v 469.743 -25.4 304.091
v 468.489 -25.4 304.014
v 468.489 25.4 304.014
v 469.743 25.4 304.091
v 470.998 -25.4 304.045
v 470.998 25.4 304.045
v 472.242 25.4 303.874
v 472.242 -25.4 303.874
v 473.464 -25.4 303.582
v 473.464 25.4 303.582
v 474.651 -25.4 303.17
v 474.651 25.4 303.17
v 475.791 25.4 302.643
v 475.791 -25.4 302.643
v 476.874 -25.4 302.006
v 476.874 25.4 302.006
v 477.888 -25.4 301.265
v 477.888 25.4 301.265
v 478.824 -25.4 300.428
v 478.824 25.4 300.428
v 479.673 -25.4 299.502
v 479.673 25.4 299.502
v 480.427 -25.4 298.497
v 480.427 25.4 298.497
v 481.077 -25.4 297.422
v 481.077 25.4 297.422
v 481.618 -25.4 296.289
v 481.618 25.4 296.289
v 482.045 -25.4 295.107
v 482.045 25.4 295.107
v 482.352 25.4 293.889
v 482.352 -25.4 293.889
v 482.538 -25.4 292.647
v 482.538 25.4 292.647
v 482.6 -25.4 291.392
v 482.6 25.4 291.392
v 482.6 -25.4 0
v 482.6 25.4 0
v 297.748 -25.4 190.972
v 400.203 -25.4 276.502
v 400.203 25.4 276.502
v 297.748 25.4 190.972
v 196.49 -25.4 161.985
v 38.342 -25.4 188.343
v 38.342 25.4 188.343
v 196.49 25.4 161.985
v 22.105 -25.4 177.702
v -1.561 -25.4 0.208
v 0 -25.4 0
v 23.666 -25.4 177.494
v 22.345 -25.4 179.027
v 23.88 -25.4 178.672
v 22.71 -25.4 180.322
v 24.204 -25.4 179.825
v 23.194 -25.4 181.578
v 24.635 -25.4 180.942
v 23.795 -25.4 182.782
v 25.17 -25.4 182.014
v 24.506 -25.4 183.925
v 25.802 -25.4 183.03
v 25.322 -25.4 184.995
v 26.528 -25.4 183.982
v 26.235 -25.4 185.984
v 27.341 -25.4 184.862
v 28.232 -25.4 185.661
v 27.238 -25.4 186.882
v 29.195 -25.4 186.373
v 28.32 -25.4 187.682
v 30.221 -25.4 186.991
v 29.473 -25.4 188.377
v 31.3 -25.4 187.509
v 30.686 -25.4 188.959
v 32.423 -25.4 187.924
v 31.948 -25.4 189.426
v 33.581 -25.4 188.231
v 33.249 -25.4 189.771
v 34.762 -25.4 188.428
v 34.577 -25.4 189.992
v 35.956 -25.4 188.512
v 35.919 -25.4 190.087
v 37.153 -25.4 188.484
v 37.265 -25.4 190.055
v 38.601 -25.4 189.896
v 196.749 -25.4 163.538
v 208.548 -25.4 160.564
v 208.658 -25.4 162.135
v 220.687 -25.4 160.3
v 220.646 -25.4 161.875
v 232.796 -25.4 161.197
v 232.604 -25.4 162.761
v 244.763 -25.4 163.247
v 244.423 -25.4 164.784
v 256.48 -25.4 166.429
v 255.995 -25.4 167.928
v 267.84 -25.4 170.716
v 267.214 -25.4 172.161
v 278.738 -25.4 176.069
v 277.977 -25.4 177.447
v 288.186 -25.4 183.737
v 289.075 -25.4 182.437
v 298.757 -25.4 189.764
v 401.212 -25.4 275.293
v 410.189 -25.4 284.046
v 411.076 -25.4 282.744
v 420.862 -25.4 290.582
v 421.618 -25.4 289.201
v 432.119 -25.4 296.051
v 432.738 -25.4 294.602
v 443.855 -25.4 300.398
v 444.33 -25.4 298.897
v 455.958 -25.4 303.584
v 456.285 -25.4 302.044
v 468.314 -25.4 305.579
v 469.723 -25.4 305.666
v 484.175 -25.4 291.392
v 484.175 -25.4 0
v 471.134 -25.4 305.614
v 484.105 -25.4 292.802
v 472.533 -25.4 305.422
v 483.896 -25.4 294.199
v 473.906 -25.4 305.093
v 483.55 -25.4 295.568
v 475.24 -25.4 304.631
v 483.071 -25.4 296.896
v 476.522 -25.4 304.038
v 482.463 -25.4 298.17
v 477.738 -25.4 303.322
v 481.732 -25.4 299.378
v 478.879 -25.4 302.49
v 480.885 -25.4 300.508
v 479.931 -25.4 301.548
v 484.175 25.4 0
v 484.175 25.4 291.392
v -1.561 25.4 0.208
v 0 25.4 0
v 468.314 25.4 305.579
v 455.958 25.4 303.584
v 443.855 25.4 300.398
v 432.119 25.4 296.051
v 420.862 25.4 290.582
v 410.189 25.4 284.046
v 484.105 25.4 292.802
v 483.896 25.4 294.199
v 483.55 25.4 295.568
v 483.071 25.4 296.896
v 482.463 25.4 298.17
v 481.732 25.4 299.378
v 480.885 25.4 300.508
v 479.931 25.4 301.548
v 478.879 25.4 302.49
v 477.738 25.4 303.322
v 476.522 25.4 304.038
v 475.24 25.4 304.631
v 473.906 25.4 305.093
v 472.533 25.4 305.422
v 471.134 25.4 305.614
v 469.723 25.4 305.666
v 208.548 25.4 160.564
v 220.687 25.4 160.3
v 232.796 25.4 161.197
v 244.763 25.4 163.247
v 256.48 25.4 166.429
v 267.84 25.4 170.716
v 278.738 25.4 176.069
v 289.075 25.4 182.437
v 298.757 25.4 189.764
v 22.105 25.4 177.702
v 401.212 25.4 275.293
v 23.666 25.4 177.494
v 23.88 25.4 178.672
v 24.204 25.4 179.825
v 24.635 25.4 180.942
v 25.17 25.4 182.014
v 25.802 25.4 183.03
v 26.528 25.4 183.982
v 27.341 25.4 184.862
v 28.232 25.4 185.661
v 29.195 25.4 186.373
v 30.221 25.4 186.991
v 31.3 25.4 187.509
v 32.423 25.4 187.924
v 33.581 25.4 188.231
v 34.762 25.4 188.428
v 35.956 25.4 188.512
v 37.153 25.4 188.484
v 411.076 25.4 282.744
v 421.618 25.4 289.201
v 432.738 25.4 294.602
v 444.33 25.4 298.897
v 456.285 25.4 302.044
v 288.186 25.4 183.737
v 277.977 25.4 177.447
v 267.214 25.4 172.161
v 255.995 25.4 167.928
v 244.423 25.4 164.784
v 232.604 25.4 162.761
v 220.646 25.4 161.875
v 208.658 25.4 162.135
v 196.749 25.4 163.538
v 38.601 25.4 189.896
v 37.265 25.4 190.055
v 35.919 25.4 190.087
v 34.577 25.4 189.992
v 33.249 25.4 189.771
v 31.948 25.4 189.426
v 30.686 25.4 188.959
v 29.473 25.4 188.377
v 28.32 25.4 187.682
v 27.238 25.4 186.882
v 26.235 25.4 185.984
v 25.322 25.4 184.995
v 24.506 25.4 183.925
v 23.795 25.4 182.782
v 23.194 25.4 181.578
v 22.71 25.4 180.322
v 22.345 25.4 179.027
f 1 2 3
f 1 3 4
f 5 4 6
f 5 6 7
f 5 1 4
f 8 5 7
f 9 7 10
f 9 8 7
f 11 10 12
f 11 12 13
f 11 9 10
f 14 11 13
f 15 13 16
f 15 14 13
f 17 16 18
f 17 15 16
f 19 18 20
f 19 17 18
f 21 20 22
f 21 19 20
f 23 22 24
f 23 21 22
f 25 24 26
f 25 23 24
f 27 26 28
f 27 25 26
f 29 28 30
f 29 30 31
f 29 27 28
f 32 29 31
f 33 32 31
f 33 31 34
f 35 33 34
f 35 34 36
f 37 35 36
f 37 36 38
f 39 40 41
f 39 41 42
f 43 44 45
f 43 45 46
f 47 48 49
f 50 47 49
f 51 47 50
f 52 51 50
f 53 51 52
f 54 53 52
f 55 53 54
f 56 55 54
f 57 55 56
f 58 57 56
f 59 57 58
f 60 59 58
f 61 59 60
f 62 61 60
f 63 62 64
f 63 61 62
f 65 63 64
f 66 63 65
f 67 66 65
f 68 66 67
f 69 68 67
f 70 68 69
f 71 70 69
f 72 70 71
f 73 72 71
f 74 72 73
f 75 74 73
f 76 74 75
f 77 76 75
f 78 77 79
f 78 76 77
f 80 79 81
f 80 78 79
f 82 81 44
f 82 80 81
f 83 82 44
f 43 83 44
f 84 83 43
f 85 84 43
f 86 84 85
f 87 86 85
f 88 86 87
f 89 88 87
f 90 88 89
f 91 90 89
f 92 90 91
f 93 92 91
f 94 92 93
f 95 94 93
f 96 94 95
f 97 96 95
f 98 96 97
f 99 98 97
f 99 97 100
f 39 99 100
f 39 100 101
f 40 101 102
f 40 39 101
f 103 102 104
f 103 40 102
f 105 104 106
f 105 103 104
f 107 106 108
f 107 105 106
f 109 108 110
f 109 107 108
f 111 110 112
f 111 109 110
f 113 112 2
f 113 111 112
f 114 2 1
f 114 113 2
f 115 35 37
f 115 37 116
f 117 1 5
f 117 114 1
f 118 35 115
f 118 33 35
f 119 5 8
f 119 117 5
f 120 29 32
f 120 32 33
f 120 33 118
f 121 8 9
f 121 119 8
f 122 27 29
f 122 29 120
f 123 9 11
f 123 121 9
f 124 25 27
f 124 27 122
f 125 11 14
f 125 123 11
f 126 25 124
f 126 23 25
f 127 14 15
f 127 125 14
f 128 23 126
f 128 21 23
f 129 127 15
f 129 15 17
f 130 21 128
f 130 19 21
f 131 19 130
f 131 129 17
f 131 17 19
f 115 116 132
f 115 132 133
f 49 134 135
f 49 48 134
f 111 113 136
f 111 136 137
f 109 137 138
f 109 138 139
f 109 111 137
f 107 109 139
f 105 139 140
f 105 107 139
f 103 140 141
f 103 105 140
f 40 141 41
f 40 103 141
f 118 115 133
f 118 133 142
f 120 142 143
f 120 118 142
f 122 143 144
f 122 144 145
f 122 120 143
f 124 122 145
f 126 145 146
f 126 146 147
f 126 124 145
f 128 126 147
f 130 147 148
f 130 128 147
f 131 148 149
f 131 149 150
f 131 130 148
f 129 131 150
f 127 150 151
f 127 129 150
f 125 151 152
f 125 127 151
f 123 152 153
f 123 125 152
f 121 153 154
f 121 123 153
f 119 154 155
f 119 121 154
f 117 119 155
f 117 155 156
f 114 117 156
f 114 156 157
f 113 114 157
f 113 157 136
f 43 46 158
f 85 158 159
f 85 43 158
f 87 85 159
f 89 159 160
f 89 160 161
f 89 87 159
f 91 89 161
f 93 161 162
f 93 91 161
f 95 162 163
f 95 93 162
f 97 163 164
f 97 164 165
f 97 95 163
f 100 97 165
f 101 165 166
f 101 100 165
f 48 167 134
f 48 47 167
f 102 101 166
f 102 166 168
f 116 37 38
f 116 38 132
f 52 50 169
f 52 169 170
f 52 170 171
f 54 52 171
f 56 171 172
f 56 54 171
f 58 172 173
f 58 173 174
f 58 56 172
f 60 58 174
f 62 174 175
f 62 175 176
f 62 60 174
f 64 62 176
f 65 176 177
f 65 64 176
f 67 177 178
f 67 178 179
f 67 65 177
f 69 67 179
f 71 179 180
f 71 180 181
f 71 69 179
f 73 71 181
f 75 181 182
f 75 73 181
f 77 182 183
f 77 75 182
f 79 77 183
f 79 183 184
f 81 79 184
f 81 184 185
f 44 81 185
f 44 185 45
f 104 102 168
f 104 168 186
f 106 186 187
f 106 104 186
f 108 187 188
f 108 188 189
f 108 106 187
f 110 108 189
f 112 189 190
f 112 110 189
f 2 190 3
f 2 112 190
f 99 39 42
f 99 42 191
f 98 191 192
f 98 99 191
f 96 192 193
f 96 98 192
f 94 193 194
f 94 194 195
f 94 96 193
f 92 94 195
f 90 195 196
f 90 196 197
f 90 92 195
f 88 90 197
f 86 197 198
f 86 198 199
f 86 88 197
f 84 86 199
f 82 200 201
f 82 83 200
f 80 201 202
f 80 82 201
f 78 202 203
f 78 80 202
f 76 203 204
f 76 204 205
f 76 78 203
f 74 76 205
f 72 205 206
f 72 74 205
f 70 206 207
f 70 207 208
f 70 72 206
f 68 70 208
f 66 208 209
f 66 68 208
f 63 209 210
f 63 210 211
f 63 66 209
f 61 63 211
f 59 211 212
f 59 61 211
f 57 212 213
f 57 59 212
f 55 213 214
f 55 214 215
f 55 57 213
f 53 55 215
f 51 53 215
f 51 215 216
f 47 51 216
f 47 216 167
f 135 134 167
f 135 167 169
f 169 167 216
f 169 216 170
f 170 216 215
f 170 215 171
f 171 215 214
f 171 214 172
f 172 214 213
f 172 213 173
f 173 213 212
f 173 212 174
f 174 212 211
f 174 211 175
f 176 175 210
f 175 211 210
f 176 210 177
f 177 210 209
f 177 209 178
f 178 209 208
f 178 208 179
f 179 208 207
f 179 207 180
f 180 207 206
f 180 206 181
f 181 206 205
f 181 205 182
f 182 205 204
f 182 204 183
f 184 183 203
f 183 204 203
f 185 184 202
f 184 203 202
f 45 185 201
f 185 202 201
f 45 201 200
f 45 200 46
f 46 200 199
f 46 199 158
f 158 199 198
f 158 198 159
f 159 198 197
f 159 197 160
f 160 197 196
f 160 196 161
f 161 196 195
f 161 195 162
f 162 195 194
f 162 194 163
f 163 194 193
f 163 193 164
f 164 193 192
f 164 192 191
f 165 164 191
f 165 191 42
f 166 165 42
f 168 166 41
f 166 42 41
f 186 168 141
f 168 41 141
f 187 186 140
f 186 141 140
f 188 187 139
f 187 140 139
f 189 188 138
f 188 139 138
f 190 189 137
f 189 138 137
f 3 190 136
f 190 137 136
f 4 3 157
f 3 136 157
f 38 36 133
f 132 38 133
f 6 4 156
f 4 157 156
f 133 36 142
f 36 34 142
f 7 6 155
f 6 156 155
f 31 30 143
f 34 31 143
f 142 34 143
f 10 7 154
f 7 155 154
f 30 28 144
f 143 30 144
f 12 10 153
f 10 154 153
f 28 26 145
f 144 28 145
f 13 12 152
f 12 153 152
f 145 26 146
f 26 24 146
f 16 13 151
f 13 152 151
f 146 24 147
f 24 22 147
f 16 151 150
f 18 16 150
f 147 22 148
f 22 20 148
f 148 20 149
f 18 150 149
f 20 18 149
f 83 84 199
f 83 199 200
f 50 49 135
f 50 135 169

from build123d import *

# Parameters (mm, degrees)
F1_DEPTH      = 25.4
F1_DEPTH_BACK = 25.4


with BuildPart() as f1:
    # F0 (on Front) → F1 (new body, two sides)
    with BuildSketch(Plane.XZ) as f1_sk:
        with BuildLine():
            Line((-1.560986, 0.208131), (0, 0))
            Line((0, 0), (23.665896, 177.494217))
            ThreePointArc((23.665896, 177.494217), (28.705317, 186.028474), (38.342357, 188.34294))
            Line((38.342357, 188.34294), (196.490305, 161.984949))
            ThreePointArc((196.490305, 161.984949), (250.659549, 164.697858), (298.757135, 189.763554))
            Line((298.757135, 189.763554), (401.211842, 275.293424))
            ThreePointArc((401.211842, 275.293424), (432.73779, 294.602226), (468.488889, 304.013615))
            ThreePointArc((468.488889, 304.013615), (478.366667, 300.858274), (482.6, 291.392253))
            Line((482.6, 291.392253), (482.6, 0))
            Line((482.6, 0), (484.1748, 0))
            Line((484.1748, 0), (484.1748, 291.392253))
            ThreePointArc((484.1748, 291.392253), (479.416533, 302.032061), (468.313911, 305.578664))
            ThreePointArc((468.313911, 305.578664), (432.119499, 296.050574), (400.202629, 276.502342))
            Line((400.202629, 276.502342), (297.747922, 190.972472))
            ThreePointArc((297.747922, 190.972472), (250.246746, 166.217591), (196.749201, 163.538322))
            Line((196.749201, 163.538322), (38.601253, 189.896314))
            ThreePointArc((38.601253, 189.896314), (27.769219, 187.294853), (22.10491, 177.702348))
            Line((22.10491, 177.702348), (-1.560986, 0.208131))
        make_face()
    extrude(amount=F1_DEPTH)
    extrude(f1_sk.sketch, amount=-F1_DEPTH_BACK)


solid = f1.part
